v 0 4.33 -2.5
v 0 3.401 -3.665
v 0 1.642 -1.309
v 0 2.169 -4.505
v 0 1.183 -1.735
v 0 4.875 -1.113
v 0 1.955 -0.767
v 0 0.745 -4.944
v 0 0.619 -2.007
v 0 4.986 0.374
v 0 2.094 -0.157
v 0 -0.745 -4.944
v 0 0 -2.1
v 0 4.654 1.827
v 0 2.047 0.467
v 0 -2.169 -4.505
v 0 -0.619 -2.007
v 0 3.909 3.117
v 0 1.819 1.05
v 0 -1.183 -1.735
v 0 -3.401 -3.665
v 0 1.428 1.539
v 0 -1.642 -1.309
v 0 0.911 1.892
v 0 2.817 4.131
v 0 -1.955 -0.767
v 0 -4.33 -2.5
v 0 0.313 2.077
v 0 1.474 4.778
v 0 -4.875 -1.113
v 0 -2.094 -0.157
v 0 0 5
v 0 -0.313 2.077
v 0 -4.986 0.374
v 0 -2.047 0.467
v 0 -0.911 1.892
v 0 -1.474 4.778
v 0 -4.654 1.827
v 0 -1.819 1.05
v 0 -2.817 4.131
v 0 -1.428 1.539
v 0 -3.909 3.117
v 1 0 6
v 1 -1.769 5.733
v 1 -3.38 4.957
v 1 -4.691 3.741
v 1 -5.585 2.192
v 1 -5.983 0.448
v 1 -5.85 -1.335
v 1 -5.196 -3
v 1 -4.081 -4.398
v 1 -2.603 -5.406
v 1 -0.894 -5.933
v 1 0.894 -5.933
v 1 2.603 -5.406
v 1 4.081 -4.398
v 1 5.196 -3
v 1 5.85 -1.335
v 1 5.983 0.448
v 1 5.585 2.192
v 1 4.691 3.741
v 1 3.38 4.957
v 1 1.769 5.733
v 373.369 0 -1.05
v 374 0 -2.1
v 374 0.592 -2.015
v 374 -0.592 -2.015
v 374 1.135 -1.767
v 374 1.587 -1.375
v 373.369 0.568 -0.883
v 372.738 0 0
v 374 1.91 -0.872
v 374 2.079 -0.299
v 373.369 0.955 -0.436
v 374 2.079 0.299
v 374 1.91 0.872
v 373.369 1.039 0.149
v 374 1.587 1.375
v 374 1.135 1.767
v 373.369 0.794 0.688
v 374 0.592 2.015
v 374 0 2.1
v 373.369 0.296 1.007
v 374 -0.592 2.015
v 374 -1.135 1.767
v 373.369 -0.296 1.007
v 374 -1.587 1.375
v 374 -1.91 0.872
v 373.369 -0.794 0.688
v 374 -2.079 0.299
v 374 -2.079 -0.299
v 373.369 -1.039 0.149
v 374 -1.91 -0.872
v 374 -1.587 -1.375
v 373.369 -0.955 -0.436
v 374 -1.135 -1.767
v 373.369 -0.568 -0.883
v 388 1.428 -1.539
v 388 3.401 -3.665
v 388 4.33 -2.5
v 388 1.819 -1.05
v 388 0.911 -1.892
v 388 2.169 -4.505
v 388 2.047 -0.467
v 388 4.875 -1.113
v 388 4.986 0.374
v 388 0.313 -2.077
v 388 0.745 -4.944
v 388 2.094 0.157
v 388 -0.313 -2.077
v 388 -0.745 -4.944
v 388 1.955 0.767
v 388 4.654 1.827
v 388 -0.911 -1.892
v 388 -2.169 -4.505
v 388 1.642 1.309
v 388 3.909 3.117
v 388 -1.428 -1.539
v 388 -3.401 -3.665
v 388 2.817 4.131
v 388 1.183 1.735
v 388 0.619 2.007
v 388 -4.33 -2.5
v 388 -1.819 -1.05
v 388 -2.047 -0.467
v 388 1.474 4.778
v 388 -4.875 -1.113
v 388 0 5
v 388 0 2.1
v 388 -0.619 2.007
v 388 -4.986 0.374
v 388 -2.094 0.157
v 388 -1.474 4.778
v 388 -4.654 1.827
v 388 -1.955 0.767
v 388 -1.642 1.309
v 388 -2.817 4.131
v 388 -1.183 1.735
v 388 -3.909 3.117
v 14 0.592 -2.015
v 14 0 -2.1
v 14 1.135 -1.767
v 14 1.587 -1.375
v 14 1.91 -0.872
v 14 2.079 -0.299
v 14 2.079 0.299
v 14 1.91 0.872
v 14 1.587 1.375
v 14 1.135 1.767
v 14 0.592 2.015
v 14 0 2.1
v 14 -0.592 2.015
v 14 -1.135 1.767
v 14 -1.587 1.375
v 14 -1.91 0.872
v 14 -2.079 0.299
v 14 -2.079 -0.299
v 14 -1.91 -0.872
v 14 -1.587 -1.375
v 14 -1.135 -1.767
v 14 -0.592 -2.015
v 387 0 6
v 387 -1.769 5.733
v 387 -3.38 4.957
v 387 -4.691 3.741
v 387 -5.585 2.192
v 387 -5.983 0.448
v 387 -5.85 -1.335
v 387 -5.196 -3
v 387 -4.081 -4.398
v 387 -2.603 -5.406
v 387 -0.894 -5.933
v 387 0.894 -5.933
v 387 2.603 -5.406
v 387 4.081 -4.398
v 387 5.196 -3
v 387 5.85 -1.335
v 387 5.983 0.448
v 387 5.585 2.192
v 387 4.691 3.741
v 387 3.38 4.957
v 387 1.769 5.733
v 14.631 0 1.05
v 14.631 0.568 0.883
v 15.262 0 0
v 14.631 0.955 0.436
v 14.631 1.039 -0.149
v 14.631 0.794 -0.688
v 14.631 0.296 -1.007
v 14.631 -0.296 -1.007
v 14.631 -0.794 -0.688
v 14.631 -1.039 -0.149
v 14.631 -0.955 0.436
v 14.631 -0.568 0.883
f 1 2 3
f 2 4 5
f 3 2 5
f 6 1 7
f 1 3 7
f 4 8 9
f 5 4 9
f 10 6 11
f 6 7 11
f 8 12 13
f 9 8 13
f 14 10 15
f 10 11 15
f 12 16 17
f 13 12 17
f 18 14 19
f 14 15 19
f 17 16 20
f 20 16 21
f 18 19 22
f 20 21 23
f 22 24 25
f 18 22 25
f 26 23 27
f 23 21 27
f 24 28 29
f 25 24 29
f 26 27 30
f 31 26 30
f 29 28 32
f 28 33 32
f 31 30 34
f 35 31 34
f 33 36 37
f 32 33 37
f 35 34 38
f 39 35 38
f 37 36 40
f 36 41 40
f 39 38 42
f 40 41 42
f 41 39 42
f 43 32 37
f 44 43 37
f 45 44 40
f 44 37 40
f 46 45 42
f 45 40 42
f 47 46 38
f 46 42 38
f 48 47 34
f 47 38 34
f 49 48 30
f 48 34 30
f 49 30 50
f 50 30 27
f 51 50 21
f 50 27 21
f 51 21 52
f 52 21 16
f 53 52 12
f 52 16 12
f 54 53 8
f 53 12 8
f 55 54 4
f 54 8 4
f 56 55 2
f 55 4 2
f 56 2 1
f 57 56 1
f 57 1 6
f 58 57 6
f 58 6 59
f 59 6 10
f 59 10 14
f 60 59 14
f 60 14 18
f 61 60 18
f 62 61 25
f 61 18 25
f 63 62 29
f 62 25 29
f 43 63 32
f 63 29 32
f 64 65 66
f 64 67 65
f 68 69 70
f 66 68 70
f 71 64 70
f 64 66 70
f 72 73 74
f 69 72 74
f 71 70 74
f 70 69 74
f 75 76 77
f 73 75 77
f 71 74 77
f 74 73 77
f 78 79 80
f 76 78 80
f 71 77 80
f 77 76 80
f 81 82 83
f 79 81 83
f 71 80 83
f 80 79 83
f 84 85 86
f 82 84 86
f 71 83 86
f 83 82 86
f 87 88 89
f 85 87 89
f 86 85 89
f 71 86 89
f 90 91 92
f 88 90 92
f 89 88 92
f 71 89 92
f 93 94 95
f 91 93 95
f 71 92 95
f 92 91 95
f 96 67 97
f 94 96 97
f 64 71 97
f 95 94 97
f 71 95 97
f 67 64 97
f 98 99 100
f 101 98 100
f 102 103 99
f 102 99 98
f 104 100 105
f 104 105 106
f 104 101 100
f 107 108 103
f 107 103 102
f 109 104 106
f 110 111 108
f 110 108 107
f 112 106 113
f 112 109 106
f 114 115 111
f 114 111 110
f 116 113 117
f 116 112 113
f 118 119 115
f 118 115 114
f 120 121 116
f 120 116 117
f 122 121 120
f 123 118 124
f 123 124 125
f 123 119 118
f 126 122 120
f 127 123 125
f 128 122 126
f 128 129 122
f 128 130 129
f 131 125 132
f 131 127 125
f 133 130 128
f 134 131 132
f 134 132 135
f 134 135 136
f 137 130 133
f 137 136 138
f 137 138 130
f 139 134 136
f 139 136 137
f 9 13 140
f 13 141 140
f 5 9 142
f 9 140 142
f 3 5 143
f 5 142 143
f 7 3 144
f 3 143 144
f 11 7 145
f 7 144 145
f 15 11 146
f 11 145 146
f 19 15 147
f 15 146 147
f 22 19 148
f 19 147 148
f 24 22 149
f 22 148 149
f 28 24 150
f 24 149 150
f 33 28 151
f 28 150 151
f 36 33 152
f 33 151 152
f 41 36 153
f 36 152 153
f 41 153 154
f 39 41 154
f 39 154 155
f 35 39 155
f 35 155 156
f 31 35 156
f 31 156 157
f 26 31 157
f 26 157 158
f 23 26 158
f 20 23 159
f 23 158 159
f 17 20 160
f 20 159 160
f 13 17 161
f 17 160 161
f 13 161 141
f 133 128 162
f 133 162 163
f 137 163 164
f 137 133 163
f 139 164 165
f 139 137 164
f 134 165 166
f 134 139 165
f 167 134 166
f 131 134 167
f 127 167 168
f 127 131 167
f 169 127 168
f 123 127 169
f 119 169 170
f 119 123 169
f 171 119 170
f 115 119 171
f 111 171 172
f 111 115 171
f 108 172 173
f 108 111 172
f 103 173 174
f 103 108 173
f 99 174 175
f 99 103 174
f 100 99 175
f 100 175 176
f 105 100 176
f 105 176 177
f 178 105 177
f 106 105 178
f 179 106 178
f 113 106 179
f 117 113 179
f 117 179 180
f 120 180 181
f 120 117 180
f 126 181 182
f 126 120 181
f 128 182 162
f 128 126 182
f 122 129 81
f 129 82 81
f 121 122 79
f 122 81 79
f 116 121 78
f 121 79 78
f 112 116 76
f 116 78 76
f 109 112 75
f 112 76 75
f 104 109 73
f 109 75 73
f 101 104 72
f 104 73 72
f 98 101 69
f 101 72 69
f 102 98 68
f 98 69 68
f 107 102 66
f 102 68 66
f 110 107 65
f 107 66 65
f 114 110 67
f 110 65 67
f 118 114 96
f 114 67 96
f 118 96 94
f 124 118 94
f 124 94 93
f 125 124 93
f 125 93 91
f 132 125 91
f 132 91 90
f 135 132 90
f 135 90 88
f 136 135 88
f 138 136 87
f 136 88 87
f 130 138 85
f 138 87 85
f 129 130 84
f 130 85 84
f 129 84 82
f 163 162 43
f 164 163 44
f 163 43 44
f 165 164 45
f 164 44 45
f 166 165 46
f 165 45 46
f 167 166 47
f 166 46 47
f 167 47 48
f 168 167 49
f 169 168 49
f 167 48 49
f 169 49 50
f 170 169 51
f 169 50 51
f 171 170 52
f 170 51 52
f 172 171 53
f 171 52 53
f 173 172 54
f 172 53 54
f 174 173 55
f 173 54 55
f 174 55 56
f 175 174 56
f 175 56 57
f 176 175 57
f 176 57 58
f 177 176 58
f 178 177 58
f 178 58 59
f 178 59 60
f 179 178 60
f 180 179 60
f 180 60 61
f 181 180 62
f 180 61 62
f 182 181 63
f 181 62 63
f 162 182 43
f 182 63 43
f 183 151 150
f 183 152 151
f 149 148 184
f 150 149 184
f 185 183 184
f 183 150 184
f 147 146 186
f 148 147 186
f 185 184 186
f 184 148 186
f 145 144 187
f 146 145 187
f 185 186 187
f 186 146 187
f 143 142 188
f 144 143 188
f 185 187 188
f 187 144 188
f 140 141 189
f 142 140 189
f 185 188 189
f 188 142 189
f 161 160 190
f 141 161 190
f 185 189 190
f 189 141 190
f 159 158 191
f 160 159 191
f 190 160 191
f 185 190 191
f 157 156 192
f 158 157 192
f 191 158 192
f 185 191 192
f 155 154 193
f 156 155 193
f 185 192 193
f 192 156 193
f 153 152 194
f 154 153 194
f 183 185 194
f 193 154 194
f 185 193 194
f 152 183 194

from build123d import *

# Parameters (mm, degrees)
SKETCH1_R             = 6
BOSS_EXTRUDE1_DEPTH   = 388
CHAMFER1_SIZE         = 1
M5_TAPPED_HOLE1_D     = 4.2
M5_TAPPED_HOLE1_DEPTH = 14
M5_TAPPED_HOLE1_TIP   = 1.2618073
M5_TAPPED_HOLE2_D     = 4.2
M5_TAPPED_HOLE2_DEPTH = 14
M5_TAPPED_HOLE2_TIP   = 1.2618073


with BuildPart() as part:
    # Sketch1 → Boss-Extrude1 (new body)
    with BuildSketch(Plane(origin=(0, 0, 0), x_dir=(0, 0, -1), z_dir=(1, 0, 0))):
        with Locations(Location((0, 0, 0), (0, 0, 180))):
            Circle(SKETCH1_R)
    extrude(amount=BOSS_EXTRUDE1_DEPTH)

    # Chamfer1
    chamfer1_edges = [part.edges().sort_by_distance(p)[0] for p in [
        (0, 0, -6),
        (388, 0, -6),
    ]]
    chamfer(chamfer1_edges, length=CHAMFER1_SIZE)

    # M5 Tapped Hole1
    with Locations(Plane(origin=(388, 0, 0), x_dir=(0, 0, -1), z_dir=(1, 0, 0))):
        with Locations((0, 0)):
            Hole(M5_TAPPED_HOLE1_D / 2, depth=M5_TAPPED_HOLE1_DEPTH)
            with Locations((0, 0, -(M5_TAPPED_HOLE1_DEPTH + M5_TAPPED_HOLE1_TIP / 2))):  # 118° drill point
                Cone(0, M5_TAPPED_HOLE1_D / 2, M5_TAPPED_HOLE1_TIP, mode=Mode.SUBTRACT)

    # M5 Tapped Hole2
    with Locations(Plane.ZY):
        with Locations((0, 0)):
            Hole(M5_TAPPED_HOLE2_D / 2, depth=M5_TAPPED_HOLE2_DEPTH)
            with Locations((0, 0, -(M5_TAPPED_HOLE2_DEPTH + M5_TAPPED_HOLE2_TIP / 2))):  # 118° drill point
                Cone(0, M5_TAPPED_HOLE2_D / 2, M5_TAPPED_HOLE2_TIP, mode=Mode.SUBTRACT)


solid = part.part
